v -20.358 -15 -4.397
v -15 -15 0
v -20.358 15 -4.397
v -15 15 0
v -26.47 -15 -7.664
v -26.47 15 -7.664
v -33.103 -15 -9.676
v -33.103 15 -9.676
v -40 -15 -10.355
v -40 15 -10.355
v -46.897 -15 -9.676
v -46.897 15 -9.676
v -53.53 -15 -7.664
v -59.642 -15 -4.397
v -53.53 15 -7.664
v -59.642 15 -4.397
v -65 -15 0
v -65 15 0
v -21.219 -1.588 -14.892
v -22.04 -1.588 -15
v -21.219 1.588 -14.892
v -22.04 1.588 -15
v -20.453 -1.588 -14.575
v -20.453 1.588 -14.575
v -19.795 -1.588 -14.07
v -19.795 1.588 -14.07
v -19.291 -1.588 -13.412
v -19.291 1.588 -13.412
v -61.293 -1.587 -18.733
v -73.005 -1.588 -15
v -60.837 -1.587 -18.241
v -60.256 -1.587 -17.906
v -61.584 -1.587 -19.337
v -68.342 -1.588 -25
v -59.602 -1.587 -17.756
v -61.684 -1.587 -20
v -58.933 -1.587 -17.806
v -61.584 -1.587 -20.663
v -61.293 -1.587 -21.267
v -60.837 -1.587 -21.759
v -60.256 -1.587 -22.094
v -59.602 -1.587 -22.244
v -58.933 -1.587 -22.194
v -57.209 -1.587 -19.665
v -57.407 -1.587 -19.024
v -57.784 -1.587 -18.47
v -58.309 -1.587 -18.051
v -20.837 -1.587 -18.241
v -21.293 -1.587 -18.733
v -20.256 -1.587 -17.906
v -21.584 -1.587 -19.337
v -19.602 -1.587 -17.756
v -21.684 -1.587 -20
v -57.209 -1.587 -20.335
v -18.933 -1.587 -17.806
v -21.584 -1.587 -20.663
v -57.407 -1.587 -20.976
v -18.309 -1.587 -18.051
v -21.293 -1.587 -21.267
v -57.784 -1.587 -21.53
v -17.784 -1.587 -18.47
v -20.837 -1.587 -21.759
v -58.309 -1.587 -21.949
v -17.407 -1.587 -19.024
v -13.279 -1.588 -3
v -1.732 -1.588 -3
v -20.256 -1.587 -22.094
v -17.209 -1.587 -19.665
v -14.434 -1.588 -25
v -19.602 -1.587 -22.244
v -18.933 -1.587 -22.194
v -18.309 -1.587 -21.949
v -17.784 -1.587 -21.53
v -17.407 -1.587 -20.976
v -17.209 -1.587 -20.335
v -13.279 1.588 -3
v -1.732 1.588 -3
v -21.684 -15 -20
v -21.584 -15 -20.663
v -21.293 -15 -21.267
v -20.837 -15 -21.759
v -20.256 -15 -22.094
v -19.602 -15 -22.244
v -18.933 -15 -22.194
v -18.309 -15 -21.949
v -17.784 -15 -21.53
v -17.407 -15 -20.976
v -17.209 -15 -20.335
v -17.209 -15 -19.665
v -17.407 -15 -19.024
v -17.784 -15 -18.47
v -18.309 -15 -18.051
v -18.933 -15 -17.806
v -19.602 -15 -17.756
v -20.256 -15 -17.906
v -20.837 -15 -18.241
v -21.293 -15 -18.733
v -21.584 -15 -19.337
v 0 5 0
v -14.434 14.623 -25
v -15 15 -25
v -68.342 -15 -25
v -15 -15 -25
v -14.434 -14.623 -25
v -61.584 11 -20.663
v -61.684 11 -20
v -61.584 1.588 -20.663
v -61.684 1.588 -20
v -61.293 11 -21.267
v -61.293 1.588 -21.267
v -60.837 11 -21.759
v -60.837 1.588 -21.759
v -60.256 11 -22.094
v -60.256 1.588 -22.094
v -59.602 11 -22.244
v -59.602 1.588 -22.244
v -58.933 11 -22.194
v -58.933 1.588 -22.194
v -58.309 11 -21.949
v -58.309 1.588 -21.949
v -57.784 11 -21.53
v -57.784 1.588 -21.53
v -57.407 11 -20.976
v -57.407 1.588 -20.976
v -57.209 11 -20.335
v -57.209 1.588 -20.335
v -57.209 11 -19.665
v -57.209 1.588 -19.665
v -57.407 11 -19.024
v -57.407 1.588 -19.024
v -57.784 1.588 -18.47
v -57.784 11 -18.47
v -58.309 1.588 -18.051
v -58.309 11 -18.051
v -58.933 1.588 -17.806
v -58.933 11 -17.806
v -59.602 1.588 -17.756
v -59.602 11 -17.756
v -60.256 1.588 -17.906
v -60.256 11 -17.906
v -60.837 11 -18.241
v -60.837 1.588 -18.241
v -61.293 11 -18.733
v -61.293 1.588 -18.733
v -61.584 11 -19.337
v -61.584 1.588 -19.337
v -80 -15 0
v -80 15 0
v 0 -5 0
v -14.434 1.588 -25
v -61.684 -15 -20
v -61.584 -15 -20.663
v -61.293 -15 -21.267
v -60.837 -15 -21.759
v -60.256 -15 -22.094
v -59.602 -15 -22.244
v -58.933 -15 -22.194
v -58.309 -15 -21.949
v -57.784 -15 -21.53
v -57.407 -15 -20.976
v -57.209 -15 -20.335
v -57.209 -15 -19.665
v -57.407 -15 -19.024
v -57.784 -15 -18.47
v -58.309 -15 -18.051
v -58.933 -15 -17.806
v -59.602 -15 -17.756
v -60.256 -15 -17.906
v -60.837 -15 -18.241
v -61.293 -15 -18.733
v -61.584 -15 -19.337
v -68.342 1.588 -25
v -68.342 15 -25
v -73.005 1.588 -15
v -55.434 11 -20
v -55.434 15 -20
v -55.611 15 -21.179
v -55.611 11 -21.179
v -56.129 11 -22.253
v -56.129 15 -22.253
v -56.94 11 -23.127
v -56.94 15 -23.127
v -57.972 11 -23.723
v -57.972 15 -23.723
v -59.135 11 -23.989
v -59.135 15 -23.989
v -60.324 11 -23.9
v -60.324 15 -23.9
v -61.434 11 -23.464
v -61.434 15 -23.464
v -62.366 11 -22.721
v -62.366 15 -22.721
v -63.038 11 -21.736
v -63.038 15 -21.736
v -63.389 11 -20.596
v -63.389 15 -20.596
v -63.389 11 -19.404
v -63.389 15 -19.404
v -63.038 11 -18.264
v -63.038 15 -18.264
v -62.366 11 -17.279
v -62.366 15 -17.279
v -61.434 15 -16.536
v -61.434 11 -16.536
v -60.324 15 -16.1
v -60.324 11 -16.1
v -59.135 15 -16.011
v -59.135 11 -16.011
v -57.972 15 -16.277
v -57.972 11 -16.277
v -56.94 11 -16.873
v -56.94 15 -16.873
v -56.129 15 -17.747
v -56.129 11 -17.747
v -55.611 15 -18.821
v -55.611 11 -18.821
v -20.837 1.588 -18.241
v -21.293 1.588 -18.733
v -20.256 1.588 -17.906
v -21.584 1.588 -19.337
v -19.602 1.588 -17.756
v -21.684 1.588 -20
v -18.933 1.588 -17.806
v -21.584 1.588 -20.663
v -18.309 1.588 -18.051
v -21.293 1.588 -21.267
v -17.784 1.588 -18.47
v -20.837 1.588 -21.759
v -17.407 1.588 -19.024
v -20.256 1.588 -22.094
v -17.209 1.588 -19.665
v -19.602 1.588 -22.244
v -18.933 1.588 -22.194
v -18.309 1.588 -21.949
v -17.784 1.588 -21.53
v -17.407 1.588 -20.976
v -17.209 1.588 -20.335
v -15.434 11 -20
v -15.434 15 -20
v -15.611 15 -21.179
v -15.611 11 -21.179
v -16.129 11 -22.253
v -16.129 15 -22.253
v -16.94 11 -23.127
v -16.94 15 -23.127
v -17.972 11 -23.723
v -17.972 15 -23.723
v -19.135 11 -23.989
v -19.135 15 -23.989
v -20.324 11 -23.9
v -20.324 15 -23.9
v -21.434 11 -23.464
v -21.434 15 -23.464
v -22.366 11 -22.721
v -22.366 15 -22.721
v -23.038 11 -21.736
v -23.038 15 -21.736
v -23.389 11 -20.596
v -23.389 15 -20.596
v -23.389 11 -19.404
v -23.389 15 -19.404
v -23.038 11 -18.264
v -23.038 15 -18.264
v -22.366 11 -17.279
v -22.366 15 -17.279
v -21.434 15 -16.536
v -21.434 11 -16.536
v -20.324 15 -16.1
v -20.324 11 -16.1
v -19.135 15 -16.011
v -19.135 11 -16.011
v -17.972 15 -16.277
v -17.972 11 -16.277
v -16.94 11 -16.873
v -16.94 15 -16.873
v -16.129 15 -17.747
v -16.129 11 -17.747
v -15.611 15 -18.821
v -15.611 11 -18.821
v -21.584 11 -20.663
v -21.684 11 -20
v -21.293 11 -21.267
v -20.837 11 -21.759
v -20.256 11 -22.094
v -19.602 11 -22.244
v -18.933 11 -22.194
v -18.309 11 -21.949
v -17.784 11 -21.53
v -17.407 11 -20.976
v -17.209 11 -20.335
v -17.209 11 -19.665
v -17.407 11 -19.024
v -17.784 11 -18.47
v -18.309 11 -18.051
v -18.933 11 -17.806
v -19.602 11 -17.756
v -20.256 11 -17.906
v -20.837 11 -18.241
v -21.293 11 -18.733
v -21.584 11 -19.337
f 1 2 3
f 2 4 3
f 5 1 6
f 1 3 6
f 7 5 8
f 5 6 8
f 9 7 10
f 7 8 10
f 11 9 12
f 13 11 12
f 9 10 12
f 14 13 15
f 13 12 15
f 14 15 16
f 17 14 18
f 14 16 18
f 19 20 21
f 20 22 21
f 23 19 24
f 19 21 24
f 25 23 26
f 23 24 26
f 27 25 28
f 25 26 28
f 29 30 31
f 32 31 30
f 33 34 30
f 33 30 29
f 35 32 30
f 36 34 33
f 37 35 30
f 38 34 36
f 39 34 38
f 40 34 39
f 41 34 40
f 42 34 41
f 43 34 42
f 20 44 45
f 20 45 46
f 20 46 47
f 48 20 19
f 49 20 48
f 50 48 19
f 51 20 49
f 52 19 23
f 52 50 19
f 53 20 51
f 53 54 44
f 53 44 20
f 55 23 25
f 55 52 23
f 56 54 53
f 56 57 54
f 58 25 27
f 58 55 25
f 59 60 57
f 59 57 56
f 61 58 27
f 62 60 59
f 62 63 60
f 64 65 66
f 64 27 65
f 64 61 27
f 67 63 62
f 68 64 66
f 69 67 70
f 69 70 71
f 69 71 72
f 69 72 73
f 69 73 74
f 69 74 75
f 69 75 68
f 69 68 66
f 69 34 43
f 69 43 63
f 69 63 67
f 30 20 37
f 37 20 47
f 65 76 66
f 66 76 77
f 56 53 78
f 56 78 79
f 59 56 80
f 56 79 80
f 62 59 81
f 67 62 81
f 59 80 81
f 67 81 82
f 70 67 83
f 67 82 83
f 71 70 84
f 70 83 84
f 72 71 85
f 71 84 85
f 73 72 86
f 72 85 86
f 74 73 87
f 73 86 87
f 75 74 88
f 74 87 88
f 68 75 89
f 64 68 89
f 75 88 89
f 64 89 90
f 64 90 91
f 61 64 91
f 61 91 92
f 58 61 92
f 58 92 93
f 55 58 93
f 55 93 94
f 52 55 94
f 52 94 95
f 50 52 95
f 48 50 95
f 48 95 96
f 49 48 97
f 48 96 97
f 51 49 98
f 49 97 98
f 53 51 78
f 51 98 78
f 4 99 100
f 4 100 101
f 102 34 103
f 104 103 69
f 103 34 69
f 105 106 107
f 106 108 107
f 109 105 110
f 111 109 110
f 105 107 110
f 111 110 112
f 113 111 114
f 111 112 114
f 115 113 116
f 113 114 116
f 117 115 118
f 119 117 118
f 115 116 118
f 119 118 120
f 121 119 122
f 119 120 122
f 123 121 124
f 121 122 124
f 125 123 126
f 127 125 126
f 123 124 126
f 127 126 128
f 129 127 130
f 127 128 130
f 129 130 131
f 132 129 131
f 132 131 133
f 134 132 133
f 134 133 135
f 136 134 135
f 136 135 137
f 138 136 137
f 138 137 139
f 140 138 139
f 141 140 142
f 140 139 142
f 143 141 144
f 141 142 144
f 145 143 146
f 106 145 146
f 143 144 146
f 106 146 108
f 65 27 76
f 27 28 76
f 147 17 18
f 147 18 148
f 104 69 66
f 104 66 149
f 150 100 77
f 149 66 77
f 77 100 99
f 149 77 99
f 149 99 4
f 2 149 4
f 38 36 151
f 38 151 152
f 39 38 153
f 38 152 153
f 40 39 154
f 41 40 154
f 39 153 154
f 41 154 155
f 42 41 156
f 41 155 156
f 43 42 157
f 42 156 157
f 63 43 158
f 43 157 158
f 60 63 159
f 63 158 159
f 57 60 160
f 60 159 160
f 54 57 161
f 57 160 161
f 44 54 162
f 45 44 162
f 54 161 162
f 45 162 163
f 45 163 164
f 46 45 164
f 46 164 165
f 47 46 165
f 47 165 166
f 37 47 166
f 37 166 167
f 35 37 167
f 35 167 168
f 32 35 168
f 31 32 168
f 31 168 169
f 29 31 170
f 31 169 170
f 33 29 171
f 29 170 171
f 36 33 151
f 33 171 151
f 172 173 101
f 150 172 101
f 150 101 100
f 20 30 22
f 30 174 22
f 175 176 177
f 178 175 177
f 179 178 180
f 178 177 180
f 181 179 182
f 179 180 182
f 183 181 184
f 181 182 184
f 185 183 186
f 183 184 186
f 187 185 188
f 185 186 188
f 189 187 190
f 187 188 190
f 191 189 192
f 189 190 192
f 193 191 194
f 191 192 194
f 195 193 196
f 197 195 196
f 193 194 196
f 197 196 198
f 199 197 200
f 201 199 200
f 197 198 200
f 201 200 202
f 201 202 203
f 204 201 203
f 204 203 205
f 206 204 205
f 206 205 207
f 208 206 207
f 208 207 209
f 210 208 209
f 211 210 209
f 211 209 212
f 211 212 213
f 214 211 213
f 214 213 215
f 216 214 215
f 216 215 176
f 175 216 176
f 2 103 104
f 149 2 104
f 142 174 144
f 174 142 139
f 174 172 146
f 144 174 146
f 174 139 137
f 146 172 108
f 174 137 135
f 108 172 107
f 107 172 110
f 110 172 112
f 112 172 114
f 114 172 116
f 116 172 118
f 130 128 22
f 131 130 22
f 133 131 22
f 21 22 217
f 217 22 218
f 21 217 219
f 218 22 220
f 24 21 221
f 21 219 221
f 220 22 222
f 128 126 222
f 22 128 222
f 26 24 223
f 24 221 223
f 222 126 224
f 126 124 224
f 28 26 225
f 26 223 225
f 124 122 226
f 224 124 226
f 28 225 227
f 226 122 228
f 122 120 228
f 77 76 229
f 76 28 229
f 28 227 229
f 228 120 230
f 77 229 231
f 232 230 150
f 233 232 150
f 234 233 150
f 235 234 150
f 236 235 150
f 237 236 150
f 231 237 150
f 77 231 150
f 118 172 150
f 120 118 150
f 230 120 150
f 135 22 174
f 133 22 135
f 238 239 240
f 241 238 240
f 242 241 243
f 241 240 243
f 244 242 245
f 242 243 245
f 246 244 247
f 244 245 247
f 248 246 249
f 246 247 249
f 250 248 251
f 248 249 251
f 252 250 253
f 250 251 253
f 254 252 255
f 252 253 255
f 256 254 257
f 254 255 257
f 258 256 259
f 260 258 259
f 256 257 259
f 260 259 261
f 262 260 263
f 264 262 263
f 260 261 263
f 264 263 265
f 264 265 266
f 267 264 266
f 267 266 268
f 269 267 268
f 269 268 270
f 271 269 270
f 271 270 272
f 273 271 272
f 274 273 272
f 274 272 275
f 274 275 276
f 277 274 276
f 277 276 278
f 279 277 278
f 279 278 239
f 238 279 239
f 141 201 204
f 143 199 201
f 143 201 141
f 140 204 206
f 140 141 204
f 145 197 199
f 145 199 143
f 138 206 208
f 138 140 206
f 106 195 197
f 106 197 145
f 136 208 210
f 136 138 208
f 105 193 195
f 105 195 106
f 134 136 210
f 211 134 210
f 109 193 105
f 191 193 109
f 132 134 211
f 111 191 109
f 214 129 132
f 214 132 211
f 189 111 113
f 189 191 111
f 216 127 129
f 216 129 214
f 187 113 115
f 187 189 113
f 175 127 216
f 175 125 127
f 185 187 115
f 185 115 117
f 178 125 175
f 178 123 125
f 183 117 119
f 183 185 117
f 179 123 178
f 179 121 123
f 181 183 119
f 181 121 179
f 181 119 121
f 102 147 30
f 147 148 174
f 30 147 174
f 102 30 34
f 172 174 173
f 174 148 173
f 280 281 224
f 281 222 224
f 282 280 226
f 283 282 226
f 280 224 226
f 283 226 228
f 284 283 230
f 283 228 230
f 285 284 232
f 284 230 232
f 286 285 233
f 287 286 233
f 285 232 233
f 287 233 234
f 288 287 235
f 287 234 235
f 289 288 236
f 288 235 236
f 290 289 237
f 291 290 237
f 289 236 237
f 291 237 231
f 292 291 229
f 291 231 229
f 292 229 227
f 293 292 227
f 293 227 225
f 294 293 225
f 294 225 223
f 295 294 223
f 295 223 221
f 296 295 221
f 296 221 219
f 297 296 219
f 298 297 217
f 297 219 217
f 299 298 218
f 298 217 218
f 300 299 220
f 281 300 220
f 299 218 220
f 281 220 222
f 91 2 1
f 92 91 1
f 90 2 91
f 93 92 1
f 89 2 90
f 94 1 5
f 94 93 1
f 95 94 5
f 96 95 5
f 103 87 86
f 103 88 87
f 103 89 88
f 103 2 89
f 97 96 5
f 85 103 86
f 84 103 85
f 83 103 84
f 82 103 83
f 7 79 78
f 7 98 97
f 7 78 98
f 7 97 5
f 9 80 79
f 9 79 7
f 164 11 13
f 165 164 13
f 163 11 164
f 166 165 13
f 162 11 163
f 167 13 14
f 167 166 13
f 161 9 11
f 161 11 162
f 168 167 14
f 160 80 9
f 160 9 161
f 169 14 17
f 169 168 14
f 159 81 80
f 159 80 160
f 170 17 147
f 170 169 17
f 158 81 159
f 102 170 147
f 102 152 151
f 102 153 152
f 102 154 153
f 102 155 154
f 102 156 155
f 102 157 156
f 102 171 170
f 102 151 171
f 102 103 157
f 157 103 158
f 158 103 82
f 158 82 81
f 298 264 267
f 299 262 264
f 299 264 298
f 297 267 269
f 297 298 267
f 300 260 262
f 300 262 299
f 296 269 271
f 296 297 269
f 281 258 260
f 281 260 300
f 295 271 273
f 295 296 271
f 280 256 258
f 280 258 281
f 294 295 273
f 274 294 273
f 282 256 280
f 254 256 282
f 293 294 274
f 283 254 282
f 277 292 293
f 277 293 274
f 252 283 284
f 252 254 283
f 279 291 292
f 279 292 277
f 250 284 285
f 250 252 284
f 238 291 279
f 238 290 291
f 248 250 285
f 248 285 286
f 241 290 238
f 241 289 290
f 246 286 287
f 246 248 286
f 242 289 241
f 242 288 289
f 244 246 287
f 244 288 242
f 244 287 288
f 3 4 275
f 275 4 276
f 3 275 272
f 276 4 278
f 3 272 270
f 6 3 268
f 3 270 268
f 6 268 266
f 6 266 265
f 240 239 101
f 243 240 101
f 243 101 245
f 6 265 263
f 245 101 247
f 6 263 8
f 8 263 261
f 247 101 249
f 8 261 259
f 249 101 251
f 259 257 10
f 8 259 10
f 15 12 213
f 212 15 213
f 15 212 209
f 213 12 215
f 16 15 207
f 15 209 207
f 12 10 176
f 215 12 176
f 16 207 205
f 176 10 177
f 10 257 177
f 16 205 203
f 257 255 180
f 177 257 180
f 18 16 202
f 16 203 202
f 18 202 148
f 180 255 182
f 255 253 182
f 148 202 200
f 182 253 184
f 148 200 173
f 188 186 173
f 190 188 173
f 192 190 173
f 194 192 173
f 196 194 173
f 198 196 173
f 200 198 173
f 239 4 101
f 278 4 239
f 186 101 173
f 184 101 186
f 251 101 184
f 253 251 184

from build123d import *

# Parameters (mm, degrees)
BOSS_EXTRUDE1_DEPTH            = 15
CUT_EXTRUDE1_DEPTH             = 1.5875
CUT_EXTRUDE1_DEPTH_BACK        = 1.5875
CBORE_FOR_M4_SHCS1_D           = 4.5
CBORE_FOR_M4_SHCS1_CBORE_D     = 8
CBORE_FOR_M4_SHCS1_CBORE_DEPTH = 4
CUT_EXTRUDE2_DEPTH             = 26


with BuildPart() as part:
    # Sketch1 → Boss-Extrude1 (new body, symmetric)
    with BuildSketch(Plane(origin=(0, 0, 0), x_dir=(1, 0, 0), z_dir=(0, 1, 0))):
        with BuildLine():
            Line((0, 0), (-15, 0))
            ThreePointArc((-15, 0), (-40, 10.355339059), (-65, 0))
            Line((-65, 0), (-80, 0))
            Line((-80, 0), (-68.342308546, 25))
            Line((-68.342308546, 25), (-14.43375673, 25))
            Line((-14.43375673, 25), (0, 0))
        make_face()
    extrude(amount=BOSS_EXTRUDE1_DEPTH, both=True)

    # Sketch2 → Cut-Extrude1 (cut, two sides)
    with BuildSketch(Plane(origin=(0, 0, 0), x_dir=(1, 0, 0), z_dir=(0, 1, 0))) as cut_extrude1_sk:
        with BuildLine():
            Line((-13.279056191, 3), (-1.732050808, 3))
            Line((-1.732050808, 3), (-14.43375673, 25))
            Line((-14.43375673, 25), (-68.342308546, 25))
            Line((-68.342308546, 25), (-73.005385128, 15))
            Line((-73.005385128, 15), (-22.040346526, 15))
            ThreePointArc((-22.040346526, 15), (-20.452846526, 14.574630657), (-19.290715869, 13.4125))
            Line((-19.290715869, 13.4125), (-13.279056191, 3))
        make_face()
    extrude(amount=CUT_EXTRUDE1_DEPTH, mode=Mode.SUBTRACT)
    extrude(cut_extrude1_sk.sketch, amount=-CUT_EXTRUDE1_DEPTH_BACK, mode=Mode.SUBTRACT)

    # CBORE for M4 SHCS1 (through all)
    with Locations(Plane(origin=(0, 15, 0), x_dir=(1, 0, 0), z_dir=(0, 1, 0))):
        with Locations((-59.43375673, 20), (-19.43375673, 20)):
            CounterBoreHole(CBORE_FOR_M4_SHCS1_D / 2, CBORE_FOR_M4_SHCS1_CBORE_D / 2, CBORE_FOR_M4_SHCS1_CBORE_DEPTH)

    # Sketch7 → Cut-Extrude2 (cut, through all)
    with BuildSketch(Plane.XY):
        Polygon((0, 5), (-15, 15), (0, 15), align=None)
        Polygon((0, -15), (-15, -15), (0, -5), align=None)
    extrude(amount=-CUT_EXTRUDE2_DEPTH, mode=Mode.SUBTRACT)


solid = part.part
